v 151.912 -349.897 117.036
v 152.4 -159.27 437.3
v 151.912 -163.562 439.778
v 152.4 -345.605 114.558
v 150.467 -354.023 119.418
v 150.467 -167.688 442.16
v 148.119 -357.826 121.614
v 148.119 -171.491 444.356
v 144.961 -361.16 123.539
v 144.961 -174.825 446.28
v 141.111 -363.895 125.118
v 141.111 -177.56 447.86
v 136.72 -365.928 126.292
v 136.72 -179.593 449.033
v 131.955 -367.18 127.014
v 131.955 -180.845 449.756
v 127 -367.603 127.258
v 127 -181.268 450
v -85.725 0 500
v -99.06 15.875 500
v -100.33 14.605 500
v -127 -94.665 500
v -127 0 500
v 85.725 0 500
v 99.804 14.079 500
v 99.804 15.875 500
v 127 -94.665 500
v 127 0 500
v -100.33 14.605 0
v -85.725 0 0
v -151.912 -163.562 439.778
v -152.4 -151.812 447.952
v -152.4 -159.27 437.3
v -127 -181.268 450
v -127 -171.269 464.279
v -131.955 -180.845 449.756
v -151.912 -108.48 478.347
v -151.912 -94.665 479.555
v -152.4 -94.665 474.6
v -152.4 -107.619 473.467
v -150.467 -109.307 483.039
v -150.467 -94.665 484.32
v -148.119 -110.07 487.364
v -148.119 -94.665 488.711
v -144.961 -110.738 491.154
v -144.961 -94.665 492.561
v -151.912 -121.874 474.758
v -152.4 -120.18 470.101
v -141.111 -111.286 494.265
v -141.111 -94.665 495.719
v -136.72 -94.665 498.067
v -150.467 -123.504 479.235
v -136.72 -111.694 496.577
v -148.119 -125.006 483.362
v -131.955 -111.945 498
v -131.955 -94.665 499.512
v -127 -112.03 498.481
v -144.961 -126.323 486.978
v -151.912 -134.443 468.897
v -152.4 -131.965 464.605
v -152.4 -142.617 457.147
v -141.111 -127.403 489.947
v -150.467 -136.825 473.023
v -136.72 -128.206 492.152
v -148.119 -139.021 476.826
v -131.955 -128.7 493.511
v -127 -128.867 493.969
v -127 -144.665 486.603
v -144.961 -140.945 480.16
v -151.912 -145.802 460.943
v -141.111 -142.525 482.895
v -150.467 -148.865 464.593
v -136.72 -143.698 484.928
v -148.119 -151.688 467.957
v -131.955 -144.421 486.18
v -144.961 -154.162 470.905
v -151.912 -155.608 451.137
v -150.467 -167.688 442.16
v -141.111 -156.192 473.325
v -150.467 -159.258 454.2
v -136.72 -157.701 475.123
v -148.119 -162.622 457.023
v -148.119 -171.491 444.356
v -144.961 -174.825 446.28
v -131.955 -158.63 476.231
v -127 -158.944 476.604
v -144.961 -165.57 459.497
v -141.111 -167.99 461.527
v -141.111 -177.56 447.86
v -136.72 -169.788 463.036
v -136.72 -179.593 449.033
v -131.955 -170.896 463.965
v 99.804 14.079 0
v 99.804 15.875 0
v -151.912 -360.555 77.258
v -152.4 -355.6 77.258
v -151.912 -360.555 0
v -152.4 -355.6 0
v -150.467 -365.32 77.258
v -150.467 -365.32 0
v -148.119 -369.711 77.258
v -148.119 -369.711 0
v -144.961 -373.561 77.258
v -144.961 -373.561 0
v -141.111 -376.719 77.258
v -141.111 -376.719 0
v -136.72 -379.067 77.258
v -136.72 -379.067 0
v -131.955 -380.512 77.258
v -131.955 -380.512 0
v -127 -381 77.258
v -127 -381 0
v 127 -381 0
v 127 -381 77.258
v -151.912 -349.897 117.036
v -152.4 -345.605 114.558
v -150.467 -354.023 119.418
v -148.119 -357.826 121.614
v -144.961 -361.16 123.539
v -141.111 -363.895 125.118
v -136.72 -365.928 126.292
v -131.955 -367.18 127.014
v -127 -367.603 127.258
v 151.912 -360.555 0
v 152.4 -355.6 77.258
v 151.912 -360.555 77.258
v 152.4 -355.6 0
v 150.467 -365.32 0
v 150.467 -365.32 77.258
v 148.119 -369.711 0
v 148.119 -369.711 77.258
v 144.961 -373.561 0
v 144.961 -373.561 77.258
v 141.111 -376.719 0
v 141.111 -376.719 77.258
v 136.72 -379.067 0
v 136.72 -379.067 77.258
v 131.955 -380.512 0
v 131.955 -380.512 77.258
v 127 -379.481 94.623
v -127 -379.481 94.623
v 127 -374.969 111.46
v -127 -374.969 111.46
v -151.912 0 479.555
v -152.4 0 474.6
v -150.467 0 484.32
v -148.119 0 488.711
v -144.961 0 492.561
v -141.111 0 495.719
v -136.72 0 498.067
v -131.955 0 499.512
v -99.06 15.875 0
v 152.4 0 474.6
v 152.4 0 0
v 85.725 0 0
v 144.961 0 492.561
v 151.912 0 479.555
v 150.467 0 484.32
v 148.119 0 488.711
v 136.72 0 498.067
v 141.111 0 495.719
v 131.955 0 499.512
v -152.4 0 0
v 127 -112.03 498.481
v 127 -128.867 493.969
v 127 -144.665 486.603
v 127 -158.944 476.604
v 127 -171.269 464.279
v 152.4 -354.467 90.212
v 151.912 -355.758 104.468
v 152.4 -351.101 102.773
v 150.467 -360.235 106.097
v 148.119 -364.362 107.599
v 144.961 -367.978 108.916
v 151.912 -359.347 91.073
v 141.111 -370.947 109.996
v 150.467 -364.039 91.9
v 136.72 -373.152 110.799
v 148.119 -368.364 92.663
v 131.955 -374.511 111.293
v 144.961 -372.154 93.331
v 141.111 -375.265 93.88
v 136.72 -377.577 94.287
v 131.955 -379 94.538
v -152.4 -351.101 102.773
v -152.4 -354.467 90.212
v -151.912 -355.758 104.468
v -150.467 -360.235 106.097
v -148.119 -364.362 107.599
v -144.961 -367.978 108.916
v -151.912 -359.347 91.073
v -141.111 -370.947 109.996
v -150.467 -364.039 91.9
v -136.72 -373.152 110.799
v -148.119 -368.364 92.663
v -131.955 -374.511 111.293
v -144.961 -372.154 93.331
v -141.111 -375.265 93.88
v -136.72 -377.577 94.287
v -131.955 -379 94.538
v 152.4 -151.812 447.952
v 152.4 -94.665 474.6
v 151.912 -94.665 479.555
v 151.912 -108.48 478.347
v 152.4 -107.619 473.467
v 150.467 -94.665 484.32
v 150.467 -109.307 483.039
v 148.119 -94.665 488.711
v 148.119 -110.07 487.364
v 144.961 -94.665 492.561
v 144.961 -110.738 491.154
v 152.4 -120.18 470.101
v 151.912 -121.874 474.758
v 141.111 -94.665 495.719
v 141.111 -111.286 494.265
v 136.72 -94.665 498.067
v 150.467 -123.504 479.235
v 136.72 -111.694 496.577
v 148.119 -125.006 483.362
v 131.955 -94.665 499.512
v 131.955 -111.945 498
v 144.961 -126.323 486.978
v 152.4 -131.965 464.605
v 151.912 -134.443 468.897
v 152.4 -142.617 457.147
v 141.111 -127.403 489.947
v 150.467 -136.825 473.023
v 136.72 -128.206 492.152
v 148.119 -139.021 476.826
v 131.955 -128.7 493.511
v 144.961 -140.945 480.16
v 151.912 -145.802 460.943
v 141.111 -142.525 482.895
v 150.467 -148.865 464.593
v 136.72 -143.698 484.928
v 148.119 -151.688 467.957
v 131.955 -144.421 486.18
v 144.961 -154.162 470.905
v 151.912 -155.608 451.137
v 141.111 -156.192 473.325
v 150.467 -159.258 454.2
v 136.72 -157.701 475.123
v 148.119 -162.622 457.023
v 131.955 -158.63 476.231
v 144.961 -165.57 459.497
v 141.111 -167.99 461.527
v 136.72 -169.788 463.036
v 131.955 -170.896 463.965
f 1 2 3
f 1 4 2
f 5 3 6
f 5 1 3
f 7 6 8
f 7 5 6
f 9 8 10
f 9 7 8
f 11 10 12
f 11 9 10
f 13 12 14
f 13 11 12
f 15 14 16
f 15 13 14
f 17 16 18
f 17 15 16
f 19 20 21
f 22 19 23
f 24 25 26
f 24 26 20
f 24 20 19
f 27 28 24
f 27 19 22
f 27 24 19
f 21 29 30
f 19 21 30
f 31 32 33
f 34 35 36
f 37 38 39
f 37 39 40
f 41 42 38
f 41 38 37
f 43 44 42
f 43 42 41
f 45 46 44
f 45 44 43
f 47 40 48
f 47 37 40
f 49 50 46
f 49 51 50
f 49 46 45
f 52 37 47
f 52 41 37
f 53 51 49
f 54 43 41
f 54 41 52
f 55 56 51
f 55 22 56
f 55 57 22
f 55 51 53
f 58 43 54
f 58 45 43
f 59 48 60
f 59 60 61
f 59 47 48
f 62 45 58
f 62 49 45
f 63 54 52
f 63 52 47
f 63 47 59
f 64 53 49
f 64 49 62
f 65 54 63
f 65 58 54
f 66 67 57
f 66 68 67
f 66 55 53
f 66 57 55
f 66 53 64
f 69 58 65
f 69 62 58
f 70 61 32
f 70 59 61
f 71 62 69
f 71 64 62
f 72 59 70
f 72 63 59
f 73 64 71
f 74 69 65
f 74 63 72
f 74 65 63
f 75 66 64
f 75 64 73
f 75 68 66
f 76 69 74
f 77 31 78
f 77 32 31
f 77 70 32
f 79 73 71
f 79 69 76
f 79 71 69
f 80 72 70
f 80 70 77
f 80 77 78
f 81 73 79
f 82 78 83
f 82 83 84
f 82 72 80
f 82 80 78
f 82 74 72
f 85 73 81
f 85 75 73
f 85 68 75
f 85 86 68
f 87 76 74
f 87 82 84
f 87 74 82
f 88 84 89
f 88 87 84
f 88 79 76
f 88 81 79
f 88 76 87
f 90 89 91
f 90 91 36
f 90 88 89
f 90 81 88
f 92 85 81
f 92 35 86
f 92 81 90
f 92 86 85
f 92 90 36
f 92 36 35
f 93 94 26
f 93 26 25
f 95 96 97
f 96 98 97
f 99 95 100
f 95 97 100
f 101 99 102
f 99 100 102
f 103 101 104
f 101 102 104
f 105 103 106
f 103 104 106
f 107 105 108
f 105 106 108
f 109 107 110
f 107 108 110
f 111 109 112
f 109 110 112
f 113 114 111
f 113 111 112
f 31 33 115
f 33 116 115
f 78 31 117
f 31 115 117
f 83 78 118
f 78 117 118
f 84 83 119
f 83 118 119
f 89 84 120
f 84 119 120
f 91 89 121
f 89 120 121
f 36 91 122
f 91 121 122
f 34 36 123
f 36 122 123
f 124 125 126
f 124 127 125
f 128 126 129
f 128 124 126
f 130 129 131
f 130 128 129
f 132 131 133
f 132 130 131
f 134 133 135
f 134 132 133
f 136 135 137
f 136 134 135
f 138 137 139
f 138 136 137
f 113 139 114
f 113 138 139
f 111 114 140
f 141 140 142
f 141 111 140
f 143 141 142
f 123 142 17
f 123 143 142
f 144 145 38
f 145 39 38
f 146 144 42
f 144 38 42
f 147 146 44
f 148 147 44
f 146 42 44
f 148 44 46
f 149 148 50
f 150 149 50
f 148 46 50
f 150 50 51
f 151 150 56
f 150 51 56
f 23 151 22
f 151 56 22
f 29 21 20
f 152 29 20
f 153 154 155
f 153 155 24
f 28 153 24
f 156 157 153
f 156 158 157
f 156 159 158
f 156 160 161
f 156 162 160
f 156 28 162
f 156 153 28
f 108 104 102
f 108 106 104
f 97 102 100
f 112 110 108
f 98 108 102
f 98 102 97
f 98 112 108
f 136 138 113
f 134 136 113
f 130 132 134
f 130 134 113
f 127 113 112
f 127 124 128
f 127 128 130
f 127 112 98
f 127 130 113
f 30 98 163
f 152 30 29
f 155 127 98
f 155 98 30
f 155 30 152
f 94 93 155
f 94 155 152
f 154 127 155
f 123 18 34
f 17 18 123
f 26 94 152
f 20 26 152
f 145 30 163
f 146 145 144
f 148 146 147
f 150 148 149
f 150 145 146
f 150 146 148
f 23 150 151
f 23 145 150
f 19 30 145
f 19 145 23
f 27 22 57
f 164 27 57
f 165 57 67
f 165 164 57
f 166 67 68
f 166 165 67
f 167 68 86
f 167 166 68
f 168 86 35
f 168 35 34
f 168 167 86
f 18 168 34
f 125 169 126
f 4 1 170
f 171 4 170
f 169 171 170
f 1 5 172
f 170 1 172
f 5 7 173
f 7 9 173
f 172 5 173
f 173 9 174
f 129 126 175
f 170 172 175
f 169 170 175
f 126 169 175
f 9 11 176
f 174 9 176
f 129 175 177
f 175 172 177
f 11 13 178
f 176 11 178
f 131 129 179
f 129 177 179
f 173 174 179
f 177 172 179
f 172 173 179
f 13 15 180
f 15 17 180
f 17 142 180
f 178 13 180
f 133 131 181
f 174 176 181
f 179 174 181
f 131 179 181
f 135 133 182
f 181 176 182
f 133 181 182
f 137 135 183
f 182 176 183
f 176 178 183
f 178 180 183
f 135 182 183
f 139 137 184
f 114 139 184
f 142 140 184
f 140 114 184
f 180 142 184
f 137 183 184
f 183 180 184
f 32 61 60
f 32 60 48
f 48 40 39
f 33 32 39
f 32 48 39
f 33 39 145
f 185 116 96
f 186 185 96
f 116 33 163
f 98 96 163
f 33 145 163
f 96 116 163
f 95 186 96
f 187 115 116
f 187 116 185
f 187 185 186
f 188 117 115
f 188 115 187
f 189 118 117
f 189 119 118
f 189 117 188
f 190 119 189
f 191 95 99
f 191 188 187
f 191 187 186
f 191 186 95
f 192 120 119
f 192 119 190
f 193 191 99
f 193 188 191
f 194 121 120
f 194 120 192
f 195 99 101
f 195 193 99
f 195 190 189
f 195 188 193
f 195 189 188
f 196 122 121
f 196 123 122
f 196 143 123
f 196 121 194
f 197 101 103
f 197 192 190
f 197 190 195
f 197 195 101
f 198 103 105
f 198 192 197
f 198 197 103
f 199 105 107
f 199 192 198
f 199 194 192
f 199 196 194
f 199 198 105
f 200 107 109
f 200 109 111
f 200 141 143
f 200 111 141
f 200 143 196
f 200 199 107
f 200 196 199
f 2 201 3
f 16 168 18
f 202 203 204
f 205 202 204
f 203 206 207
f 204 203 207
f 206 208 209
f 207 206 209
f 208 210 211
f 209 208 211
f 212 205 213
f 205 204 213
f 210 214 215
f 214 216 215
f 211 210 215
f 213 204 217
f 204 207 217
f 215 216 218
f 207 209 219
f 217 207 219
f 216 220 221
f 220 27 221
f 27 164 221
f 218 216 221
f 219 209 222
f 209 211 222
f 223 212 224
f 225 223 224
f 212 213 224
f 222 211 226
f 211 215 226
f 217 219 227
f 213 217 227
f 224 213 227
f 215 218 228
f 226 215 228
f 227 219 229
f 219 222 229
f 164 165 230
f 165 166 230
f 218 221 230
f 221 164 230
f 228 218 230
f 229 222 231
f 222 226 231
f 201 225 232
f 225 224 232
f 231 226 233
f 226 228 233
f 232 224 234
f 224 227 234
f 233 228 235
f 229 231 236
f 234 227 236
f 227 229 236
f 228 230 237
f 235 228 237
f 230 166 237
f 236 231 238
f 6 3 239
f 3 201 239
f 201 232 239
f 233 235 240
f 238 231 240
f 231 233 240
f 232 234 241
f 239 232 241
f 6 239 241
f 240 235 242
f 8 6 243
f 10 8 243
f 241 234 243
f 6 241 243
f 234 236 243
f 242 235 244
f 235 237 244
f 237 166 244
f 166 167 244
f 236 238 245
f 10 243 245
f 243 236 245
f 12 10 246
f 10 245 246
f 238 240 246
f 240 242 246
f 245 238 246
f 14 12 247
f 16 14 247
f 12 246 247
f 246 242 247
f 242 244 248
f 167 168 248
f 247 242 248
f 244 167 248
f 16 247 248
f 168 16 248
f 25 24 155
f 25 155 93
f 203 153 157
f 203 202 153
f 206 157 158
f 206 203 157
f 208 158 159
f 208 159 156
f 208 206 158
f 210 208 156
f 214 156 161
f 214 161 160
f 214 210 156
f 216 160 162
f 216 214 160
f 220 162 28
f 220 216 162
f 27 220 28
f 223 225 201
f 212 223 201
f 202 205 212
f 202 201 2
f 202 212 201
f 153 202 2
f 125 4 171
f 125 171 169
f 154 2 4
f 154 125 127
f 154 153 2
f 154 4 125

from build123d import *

# Parameters (mm, degrees)
EXTRUDE1_DEPTH  = 152.4
EXTRUDE2_DEPTH  = 500
CHAMFER1_SIZE   = 1.796051224
CHAMFER1_SIZE_2 = 2.54
FILLET1_R       = 100
FILLET2_R       = 25.4


with BuildPart() as part:
    # Sketch1 → Extrude1 (new, symmetric)
    with BuildSketch(Plane(origin=(0, 0, 0), x_dir=(0, 0, -1), z_dir=(1, 0, 0))):
        Polygon((0, 0), (-500, 0), (-500, -152.4), (-104.05318539, -381), (0, -381), align=None)
    extrude(amount=EXTRUDE1_DEPTH, both=True)

    # Sketch2 → Extrude2 (add, through all)
    with BuildSketch(Plane(origin=(0, 0, 0), x_dir=(-1, 0, 0), z_dir=(0, 0, -1))):
        Polygon((-85.725, 0), (-101.6, 15.875), (101.6, 15.875), (85.725, 0), align=None)
    extrude(amount=-EXTRUDE2_DEPTH)

    # Chamfer1
    # the kernel refuses this chamfer: 2.54, 1.796051224 mm, written as the material it takes off along each edge
    with BuildSketch(Plane(origin=(-101.6, 15.875, -6.532074789), x_dir=(0.6660419652145836, -0.7459142715976788, 0), z_dir=(0, 0, 1)), Plane(origin=(101.6, 15.875, -6.532074789), x_dir=(-0.9984038297885897, 0.056478249472489896, 0), z_dir=(0, 0, 1))) as chamfer1_piece_1:
        Polygon((CHAMFER1_SIZE * 0.998403829907, CHAMFER1_SIZE * 0.0564782494792), (CHAMFER1_SIZE_2 * 0.666041965215, CHAMFER1_SIZE_2 * 0.745914271598), (0, 0), align=None)
    extrude(amount=513.064149579, mode=Mode.SUBTRACT)

    # Fillet1
    fillet1_edges = [part.edges().sort_by_distance(p)[0] for p in [
        (0, -381, 104.05318539),
        (0, -152.4, 500),
    ]]
    fillet(fillet1_edges, radius=FILLET1_R)

    # Fillet2
    fillet2_edges = [part.edges().sort_by_distance(p)[0] for p in [
        (-152.4, -381, 38.629133073),
        (-152.4, -377.592582629, 103.140170657),
        (-152.4, -274.435026919, 288.629133073),
        (-152.4, -144.664973081, 486.602540378),
        (152.4, -381, 38.629133073),
        (152.4, -377.592582629, 103.140170657),
        (152.4, -274.435026919, 288.629133073),
        (152.4, -144.664973081, 486.602540378),
        (-152.4, -47.332486541, 500),
        (152.4, -47.332486541, 500),
    ]]
    fillet(fillet2_edges, radius=FILLET2_R)


solid = part.part
